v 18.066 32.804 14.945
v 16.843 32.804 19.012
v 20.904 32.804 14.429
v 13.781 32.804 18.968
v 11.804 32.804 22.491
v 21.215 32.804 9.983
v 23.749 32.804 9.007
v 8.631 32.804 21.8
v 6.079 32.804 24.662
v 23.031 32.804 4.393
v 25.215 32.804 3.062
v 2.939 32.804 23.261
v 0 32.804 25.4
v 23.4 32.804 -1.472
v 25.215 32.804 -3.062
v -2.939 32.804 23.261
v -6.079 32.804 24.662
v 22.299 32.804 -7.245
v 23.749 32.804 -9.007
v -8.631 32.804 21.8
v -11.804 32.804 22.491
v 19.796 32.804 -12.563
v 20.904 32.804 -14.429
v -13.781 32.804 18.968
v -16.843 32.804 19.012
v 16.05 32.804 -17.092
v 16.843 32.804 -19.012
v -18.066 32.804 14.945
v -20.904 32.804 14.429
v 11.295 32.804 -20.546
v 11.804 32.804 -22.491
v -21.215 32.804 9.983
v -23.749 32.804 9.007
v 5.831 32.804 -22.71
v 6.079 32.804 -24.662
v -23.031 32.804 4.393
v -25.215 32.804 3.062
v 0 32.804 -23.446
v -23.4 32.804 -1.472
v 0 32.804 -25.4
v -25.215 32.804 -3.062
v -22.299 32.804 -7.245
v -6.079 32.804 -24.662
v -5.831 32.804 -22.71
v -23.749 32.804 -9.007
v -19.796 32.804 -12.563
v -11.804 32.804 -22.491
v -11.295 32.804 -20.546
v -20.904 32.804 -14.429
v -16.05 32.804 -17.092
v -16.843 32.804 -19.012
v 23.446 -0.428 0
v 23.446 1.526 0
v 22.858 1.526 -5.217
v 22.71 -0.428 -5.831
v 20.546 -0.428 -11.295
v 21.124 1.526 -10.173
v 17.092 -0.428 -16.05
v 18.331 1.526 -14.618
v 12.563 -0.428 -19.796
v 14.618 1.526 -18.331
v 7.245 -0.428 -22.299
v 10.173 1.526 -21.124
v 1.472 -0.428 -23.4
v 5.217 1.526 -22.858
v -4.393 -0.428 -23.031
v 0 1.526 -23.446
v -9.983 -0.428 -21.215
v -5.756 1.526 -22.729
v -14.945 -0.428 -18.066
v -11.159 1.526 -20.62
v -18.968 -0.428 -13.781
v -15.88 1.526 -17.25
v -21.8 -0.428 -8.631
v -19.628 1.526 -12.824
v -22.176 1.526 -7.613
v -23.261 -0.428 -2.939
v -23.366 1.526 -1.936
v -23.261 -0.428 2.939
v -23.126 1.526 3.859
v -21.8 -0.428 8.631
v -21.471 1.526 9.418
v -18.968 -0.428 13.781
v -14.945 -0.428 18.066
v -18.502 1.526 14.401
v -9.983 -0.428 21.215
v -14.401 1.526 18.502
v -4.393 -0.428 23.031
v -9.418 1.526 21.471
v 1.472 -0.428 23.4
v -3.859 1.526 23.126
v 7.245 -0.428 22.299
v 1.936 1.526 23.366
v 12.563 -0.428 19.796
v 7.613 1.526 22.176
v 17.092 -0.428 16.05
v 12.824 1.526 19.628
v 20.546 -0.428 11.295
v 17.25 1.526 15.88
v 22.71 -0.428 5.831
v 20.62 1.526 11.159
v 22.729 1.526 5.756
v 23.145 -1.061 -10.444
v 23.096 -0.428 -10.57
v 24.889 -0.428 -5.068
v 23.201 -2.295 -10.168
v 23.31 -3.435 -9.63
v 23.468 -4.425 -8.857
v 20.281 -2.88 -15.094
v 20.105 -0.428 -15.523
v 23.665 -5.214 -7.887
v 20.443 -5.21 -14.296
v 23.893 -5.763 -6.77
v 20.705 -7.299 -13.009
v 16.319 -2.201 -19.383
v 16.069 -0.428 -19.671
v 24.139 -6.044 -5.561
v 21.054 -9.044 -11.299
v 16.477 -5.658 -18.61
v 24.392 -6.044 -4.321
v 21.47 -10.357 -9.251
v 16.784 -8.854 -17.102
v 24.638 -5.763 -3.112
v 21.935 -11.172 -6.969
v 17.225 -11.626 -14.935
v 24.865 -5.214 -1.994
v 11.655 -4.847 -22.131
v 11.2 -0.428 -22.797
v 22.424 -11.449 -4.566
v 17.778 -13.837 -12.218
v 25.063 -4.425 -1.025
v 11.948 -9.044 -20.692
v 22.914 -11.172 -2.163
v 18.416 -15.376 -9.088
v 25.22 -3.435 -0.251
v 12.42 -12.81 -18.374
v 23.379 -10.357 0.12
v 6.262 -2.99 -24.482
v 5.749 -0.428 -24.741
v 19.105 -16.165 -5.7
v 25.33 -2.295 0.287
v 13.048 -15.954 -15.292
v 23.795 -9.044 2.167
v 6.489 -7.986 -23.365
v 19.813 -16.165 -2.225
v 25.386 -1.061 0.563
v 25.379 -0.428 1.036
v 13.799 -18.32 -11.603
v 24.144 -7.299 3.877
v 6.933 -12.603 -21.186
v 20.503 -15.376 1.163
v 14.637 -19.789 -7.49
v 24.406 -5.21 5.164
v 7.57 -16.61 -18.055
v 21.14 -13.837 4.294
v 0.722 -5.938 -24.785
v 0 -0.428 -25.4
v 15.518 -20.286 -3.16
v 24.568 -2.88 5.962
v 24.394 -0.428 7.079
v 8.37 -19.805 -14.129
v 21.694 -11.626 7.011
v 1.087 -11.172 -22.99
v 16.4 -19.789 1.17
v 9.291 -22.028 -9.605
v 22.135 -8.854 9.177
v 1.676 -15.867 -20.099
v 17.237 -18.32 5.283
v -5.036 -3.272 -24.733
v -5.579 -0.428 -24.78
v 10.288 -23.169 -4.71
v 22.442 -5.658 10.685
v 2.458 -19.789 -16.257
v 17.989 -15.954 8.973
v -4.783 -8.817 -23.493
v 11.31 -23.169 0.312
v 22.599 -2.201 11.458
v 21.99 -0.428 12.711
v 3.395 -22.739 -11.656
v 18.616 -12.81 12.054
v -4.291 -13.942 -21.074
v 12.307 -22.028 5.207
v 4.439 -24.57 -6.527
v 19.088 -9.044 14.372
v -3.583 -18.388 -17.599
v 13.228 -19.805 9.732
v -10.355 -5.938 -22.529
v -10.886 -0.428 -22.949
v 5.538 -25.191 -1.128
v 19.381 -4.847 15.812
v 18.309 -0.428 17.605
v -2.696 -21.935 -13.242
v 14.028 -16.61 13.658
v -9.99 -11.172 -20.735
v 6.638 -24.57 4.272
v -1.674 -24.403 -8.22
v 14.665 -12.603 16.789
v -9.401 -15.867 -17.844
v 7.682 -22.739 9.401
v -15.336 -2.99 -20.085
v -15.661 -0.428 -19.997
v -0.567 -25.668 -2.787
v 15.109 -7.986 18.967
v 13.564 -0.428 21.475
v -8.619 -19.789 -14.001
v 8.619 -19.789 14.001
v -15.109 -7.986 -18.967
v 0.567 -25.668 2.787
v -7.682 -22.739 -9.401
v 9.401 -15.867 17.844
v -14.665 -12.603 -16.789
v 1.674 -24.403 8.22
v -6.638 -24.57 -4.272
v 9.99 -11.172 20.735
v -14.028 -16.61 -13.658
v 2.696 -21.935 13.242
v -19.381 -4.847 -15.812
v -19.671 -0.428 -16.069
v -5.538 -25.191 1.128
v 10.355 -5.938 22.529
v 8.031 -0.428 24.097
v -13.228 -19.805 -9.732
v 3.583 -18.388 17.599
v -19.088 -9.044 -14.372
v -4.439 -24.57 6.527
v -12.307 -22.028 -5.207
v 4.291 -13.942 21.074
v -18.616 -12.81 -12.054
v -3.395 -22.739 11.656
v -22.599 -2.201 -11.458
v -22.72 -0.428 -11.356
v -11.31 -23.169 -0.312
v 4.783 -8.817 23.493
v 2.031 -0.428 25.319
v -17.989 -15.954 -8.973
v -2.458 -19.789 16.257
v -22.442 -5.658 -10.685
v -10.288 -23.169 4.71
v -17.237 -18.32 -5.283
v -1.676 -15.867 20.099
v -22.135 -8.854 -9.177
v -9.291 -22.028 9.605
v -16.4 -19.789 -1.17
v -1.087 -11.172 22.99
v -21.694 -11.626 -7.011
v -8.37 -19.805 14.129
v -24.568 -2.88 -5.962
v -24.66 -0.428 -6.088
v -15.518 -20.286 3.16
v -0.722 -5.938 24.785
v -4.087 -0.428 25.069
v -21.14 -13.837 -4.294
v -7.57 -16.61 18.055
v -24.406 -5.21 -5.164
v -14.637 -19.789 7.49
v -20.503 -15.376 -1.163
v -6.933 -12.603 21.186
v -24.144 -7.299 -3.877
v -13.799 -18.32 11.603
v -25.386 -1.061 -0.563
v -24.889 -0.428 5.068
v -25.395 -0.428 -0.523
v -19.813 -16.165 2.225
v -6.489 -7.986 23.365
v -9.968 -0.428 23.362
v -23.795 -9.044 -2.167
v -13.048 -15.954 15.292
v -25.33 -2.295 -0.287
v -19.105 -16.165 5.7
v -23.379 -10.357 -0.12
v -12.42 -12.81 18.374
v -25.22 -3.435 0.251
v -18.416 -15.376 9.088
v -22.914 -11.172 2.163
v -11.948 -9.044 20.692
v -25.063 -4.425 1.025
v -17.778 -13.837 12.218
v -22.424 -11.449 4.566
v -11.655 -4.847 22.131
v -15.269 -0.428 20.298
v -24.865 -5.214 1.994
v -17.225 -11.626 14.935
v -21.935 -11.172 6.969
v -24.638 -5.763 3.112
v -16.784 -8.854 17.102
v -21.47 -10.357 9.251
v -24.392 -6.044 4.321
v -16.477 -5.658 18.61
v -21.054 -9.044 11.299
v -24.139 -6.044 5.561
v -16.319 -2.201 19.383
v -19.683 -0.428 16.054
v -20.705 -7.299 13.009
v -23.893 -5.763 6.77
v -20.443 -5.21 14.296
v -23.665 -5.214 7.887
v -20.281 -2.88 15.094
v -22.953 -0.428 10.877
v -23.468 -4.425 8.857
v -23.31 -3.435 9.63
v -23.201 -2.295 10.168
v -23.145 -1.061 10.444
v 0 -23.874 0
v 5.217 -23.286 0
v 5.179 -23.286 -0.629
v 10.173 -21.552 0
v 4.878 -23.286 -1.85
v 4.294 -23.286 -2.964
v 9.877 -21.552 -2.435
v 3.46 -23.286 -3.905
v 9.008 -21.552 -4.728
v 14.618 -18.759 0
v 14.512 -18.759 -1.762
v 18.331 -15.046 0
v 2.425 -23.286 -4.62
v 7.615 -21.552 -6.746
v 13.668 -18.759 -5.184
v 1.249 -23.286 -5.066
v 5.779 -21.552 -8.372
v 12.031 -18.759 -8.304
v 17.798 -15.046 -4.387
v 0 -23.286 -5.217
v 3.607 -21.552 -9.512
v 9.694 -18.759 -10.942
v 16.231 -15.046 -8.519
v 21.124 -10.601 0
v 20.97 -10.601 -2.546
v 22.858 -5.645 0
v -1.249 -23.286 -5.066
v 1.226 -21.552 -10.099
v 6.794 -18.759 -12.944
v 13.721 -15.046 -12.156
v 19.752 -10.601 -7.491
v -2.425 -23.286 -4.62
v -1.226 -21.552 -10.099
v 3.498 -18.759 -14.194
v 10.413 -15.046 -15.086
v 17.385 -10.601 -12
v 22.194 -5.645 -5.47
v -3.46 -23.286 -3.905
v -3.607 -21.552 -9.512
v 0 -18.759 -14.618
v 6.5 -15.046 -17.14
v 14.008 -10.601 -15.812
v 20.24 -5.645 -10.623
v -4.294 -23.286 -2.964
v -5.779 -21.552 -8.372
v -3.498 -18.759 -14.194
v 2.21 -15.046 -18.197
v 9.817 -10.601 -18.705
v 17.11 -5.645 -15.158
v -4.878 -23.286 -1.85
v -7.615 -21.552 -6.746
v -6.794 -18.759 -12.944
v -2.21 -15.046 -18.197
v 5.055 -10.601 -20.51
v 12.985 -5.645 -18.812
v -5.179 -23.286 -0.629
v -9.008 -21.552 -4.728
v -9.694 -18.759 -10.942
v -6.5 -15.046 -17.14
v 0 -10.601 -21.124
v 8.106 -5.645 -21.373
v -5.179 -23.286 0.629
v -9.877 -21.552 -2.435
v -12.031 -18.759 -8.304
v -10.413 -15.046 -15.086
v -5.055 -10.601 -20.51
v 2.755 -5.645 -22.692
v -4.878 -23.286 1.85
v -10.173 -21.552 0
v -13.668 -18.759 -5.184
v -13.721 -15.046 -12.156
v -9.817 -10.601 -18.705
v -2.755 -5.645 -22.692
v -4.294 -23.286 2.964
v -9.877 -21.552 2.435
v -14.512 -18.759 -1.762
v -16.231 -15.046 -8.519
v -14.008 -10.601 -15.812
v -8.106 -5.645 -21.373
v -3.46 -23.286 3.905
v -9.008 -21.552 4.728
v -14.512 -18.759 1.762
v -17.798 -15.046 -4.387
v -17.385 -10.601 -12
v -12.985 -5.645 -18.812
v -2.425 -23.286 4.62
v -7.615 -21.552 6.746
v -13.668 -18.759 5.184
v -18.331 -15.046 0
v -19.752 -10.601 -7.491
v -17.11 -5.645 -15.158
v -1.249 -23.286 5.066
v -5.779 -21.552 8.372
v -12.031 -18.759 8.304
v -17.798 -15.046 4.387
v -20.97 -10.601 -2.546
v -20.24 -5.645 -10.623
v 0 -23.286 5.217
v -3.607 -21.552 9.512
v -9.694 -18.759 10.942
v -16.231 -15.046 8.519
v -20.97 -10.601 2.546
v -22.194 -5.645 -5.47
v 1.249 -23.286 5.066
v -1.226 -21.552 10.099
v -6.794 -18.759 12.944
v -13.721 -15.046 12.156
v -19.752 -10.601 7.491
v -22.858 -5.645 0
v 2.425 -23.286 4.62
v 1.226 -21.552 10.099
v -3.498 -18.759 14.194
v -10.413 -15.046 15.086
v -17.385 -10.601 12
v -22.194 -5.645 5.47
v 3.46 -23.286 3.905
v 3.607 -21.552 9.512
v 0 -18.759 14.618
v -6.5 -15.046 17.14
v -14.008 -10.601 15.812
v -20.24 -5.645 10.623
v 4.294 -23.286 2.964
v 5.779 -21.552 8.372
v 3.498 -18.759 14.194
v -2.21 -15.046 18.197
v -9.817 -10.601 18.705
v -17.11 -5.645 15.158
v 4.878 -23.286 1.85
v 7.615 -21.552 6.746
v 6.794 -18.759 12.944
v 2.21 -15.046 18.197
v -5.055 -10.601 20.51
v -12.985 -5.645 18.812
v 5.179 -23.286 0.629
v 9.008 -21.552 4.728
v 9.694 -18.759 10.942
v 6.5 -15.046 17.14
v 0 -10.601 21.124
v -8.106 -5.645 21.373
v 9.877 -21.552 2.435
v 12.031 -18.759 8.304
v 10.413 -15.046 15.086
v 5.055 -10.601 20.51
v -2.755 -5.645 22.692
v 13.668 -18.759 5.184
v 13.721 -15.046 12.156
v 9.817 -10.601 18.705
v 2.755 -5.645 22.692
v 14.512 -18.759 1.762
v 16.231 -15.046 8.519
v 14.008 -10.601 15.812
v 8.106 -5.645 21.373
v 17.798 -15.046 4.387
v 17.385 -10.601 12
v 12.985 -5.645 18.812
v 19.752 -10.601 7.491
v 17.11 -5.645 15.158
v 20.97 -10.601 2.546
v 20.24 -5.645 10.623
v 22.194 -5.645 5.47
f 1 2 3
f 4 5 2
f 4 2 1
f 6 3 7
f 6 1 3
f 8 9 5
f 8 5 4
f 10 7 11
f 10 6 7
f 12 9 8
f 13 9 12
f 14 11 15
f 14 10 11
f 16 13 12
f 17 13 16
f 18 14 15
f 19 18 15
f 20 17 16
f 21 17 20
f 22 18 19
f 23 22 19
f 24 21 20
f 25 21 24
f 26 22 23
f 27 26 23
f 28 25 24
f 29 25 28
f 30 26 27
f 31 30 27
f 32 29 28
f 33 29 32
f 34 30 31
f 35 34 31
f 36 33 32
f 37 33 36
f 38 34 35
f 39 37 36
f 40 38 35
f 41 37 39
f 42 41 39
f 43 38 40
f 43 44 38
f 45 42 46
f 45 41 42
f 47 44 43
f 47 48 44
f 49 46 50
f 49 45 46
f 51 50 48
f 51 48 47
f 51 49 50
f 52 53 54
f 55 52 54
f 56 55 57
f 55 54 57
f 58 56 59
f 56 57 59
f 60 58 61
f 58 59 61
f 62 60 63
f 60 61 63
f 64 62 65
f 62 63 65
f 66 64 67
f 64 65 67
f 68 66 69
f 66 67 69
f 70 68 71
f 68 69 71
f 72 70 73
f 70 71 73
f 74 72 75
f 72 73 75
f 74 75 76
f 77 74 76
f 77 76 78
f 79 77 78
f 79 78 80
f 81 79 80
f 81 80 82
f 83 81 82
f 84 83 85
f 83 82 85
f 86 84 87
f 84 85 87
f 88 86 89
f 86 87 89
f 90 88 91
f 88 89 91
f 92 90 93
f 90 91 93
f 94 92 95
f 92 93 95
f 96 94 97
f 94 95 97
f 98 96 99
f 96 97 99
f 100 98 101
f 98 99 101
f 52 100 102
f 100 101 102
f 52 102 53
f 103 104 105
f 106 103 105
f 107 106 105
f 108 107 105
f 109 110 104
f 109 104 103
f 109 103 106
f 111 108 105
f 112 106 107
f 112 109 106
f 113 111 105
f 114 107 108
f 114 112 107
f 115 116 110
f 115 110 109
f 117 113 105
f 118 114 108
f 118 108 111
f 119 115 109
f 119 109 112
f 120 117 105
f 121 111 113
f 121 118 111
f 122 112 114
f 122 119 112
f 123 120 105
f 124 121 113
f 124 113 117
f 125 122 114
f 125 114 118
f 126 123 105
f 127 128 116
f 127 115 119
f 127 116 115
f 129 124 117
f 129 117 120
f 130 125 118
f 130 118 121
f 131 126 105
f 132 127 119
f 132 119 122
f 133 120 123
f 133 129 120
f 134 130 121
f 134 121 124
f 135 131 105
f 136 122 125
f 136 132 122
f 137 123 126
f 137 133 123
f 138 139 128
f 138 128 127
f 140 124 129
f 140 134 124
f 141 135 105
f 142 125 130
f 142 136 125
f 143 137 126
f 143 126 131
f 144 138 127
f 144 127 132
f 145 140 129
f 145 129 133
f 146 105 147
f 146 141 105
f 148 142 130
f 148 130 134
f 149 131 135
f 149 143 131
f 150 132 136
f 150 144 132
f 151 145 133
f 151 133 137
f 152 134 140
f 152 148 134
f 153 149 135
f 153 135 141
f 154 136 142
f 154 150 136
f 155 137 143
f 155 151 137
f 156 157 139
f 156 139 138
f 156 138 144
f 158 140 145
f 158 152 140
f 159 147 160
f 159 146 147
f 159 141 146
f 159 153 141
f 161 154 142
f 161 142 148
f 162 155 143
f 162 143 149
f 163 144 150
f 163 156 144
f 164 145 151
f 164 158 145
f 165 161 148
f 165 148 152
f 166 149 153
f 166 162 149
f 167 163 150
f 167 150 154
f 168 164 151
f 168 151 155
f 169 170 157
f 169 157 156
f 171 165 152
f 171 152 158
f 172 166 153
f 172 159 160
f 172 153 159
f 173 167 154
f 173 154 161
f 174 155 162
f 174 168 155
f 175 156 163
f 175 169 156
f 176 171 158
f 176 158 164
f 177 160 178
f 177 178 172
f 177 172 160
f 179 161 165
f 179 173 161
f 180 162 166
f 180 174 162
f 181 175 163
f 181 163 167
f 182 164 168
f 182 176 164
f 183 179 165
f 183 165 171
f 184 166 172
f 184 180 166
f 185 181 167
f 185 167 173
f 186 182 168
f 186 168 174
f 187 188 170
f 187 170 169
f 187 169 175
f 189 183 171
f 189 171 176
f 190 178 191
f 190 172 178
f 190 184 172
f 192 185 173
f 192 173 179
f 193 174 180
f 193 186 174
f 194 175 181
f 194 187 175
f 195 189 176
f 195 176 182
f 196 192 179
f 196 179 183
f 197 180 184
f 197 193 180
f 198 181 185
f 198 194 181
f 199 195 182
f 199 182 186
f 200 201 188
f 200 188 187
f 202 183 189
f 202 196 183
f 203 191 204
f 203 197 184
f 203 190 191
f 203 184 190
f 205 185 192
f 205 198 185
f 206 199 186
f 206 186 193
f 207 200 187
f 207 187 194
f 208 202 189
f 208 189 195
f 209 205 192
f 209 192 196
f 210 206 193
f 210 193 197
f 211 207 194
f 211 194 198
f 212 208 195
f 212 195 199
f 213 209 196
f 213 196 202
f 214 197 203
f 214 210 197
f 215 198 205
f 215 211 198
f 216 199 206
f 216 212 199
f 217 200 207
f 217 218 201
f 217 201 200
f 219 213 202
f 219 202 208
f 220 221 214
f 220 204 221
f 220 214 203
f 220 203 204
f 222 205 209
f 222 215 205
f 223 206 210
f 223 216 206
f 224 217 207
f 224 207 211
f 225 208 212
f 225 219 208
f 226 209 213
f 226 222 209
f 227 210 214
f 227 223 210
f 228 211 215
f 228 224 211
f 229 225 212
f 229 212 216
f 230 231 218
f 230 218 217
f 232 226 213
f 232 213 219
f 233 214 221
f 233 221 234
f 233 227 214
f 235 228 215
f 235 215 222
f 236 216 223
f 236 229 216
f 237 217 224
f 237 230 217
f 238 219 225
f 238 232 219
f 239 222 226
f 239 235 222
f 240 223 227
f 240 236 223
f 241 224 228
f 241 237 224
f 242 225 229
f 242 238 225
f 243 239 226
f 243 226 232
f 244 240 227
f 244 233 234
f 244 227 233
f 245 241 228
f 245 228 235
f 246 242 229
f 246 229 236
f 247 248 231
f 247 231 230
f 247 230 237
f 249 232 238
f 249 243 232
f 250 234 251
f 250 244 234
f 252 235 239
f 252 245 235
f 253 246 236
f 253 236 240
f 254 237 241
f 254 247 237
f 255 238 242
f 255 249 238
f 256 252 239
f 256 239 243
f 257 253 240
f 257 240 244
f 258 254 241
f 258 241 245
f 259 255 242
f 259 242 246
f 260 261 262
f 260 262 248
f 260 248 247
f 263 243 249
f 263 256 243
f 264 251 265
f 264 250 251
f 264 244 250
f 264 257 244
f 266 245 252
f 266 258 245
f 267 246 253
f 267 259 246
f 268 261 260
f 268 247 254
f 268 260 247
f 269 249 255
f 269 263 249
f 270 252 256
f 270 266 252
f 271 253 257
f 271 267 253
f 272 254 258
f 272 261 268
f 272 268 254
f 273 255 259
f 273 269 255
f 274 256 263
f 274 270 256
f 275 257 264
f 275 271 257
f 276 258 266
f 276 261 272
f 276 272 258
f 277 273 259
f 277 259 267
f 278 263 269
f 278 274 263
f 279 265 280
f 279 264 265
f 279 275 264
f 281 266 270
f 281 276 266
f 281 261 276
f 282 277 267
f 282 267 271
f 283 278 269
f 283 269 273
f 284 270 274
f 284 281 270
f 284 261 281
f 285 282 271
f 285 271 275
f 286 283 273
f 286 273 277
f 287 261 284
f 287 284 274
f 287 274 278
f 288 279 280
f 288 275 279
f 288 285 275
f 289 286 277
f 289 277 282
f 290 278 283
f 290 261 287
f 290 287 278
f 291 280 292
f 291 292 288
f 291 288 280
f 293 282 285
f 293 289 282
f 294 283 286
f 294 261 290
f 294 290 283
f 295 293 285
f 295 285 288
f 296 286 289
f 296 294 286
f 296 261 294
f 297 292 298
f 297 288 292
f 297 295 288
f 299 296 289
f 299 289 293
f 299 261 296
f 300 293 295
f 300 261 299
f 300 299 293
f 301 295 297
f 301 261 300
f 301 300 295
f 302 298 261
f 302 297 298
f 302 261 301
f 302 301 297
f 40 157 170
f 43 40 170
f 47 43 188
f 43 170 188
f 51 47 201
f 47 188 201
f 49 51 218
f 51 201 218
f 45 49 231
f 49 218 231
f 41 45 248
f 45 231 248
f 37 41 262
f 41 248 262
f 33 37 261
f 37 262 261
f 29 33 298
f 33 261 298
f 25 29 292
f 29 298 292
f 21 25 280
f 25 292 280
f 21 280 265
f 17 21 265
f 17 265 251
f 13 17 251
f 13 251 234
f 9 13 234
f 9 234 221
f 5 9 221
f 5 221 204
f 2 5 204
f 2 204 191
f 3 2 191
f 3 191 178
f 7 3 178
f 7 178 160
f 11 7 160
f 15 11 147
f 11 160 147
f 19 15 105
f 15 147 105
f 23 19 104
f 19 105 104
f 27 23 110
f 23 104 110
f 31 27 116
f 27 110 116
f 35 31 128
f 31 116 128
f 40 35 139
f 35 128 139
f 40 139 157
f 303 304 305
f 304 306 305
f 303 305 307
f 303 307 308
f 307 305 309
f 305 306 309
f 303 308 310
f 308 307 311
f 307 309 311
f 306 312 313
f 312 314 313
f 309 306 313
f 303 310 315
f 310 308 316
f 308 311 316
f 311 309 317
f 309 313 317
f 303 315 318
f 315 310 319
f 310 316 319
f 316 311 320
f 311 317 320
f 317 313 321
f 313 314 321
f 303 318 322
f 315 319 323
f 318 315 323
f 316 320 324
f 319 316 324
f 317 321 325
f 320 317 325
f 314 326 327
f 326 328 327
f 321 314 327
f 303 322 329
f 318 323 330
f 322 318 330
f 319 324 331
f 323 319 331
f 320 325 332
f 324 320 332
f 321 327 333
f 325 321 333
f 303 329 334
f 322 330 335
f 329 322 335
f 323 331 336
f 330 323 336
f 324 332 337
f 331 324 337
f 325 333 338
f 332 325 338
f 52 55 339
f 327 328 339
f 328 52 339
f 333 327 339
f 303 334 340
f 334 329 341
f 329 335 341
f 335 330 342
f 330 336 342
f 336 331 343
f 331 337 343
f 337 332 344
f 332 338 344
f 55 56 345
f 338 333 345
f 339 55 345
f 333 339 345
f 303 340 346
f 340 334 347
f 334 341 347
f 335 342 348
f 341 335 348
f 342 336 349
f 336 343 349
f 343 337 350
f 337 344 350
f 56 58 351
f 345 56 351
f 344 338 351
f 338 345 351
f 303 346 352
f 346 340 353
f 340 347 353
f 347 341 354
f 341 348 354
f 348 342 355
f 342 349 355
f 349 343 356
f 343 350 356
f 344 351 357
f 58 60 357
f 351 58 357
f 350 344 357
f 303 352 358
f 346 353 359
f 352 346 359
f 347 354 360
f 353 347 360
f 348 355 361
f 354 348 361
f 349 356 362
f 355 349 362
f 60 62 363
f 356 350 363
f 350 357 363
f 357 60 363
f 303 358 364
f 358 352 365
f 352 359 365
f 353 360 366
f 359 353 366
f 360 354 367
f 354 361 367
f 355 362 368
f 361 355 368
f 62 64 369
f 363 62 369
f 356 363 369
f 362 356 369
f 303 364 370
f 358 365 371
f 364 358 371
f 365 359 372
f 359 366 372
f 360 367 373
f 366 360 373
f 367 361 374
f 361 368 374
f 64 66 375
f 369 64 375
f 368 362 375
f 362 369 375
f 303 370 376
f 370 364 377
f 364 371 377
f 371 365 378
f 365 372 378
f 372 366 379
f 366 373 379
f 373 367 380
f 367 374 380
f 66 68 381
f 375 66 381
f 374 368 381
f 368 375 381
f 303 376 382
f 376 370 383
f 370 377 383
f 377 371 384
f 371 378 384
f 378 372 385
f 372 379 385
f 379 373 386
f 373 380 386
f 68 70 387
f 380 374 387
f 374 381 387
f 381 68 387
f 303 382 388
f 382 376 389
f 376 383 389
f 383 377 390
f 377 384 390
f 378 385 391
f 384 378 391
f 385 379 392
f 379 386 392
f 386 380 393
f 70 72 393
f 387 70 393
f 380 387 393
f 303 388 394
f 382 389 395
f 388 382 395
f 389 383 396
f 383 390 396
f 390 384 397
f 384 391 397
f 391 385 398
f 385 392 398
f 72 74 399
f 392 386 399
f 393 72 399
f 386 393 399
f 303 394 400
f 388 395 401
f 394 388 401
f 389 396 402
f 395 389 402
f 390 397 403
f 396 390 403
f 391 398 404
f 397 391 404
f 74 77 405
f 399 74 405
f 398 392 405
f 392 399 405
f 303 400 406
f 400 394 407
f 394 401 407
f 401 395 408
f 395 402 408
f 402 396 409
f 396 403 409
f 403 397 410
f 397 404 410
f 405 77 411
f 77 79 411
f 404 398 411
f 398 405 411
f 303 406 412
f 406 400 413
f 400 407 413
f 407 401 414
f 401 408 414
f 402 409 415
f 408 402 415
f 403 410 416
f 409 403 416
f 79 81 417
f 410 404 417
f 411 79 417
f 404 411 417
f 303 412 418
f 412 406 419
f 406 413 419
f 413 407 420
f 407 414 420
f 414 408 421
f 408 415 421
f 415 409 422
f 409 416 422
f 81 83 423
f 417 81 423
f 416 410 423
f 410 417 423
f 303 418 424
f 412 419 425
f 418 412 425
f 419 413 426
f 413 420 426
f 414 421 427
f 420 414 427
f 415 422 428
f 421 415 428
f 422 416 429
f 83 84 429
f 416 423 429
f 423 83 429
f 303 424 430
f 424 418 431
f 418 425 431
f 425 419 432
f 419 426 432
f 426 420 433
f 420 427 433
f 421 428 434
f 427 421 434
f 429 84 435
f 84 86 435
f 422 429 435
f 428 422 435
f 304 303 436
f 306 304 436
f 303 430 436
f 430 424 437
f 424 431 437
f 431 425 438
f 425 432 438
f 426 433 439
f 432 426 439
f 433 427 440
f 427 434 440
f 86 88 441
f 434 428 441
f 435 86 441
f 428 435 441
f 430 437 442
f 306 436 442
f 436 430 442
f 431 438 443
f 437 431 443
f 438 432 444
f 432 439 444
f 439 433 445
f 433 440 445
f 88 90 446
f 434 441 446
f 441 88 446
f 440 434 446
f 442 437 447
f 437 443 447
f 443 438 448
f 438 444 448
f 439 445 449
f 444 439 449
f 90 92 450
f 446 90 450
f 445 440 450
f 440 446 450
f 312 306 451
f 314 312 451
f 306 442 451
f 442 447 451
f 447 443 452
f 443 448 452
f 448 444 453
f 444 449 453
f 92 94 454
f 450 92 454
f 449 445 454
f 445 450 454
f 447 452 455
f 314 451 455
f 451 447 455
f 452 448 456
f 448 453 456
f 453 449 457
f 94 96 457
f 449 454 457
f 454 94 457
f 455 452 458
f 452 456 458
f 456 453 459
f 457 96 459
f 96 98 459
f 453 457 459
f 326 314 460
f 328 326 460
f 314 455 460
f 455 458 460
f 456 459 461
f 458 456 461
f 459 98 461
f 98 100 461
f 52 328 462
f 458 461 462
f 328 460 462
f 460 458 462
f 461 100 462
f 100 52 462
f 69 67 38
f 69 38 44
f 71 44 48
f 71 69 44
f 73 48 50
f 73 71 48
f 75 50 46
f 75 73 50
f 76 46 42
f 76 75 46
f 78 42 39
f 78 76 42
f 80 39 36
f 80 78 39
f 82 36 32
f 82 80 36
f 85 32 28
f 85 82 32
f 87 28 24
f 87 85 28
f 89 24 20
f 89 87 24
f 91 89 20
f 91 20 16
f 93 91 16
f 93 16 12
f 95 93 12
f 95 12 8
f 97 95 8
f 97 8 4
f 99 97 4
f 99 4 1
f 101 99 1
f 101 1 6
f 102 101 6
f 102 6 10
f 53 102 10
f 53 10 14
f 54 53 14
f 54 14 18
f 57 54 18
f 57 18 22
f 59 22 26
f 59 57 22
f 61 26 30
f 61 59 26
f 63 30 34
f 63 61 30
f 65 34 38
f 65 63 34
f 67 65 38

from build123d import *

# Parameters (mm, degrees)
SKETCH1_R           = 38.1
BOSS_EXTRUDE1_DEPTH = 50.827459459
SHELL2_T            = 3.175
REVOLVE1_ANGLE      = 180
SCALE1_SCALE        = 0.615384615


# Read off the part's stored shape, not the designer's step: Shell4
with BuildPart() as part:
    # Sketch1 → Boss-Extrude1 (new body)
    with BuildSketch(Plane(origin=(0, 0, 0), x_dir=(1, 0, 0), z_dir=(0, 1, 0))):
        with Locations(Location((0, 0, 0), (0, 0, 90))):
            Circle(SKETCH1_R)
    extrude(amount=BOSS_EXTRUDE1_DEPTH)

    # Shell2
    shell2_openings = [part.faces().sort_by_distance(p)[0] for p in [
        (0, 50.827459459, 0),
    ]]
    offset(amount=SHELL2_T, openings=shell2_openings, kind=Kind.INTERSECTION)

    # Sketch5 → Revolve1 (revolve)
    with BuildSketch(Plane.XZ.offset(3.175)):
        with BuildLine():
            Line((-40.445113765, 8.235192624), (40.445113765, -8.235192624))
            ThreePointArc((40.445113765, -8.235192624), (-8.235192624, -40.445113765), (-40.445113765, 8.235192624))
        make_face()
    revolve(axis=Axis((-40.445113765, -3.175, 8.235192624), (-0.979893731431563, 0, 0.19952011202164077)), revolution_arc=REVOLVE1_ANGLE)

    # Shell4 outline → Shell4 (revolve, cut)
    with BuildSketch(Plane.XY):
        with BuildLine():
            ThreePointArc((0, -41.275), (26.940768377, -30.11576835), (38.1, -3.174999962))
            Line((38.1, -3.174999962), (38.1, 0))
            Line((38.1, 0), (0, 0))
            Line((0, 0), (0, -41.275))
        make_face()
    revolve(axis=Axis((0, 0, 0), (0, 1, 0)), mode=Mode.SUBTRACT)


with BuildPart() as part_1:
    # Scale1: scaled about (-2e-09, 3.96741665, 0)
    add(part.part.scale(SCALE1_SCALE).moved(Location((-1e-09, 1.525929481, 0))))


solid = part_1.part
